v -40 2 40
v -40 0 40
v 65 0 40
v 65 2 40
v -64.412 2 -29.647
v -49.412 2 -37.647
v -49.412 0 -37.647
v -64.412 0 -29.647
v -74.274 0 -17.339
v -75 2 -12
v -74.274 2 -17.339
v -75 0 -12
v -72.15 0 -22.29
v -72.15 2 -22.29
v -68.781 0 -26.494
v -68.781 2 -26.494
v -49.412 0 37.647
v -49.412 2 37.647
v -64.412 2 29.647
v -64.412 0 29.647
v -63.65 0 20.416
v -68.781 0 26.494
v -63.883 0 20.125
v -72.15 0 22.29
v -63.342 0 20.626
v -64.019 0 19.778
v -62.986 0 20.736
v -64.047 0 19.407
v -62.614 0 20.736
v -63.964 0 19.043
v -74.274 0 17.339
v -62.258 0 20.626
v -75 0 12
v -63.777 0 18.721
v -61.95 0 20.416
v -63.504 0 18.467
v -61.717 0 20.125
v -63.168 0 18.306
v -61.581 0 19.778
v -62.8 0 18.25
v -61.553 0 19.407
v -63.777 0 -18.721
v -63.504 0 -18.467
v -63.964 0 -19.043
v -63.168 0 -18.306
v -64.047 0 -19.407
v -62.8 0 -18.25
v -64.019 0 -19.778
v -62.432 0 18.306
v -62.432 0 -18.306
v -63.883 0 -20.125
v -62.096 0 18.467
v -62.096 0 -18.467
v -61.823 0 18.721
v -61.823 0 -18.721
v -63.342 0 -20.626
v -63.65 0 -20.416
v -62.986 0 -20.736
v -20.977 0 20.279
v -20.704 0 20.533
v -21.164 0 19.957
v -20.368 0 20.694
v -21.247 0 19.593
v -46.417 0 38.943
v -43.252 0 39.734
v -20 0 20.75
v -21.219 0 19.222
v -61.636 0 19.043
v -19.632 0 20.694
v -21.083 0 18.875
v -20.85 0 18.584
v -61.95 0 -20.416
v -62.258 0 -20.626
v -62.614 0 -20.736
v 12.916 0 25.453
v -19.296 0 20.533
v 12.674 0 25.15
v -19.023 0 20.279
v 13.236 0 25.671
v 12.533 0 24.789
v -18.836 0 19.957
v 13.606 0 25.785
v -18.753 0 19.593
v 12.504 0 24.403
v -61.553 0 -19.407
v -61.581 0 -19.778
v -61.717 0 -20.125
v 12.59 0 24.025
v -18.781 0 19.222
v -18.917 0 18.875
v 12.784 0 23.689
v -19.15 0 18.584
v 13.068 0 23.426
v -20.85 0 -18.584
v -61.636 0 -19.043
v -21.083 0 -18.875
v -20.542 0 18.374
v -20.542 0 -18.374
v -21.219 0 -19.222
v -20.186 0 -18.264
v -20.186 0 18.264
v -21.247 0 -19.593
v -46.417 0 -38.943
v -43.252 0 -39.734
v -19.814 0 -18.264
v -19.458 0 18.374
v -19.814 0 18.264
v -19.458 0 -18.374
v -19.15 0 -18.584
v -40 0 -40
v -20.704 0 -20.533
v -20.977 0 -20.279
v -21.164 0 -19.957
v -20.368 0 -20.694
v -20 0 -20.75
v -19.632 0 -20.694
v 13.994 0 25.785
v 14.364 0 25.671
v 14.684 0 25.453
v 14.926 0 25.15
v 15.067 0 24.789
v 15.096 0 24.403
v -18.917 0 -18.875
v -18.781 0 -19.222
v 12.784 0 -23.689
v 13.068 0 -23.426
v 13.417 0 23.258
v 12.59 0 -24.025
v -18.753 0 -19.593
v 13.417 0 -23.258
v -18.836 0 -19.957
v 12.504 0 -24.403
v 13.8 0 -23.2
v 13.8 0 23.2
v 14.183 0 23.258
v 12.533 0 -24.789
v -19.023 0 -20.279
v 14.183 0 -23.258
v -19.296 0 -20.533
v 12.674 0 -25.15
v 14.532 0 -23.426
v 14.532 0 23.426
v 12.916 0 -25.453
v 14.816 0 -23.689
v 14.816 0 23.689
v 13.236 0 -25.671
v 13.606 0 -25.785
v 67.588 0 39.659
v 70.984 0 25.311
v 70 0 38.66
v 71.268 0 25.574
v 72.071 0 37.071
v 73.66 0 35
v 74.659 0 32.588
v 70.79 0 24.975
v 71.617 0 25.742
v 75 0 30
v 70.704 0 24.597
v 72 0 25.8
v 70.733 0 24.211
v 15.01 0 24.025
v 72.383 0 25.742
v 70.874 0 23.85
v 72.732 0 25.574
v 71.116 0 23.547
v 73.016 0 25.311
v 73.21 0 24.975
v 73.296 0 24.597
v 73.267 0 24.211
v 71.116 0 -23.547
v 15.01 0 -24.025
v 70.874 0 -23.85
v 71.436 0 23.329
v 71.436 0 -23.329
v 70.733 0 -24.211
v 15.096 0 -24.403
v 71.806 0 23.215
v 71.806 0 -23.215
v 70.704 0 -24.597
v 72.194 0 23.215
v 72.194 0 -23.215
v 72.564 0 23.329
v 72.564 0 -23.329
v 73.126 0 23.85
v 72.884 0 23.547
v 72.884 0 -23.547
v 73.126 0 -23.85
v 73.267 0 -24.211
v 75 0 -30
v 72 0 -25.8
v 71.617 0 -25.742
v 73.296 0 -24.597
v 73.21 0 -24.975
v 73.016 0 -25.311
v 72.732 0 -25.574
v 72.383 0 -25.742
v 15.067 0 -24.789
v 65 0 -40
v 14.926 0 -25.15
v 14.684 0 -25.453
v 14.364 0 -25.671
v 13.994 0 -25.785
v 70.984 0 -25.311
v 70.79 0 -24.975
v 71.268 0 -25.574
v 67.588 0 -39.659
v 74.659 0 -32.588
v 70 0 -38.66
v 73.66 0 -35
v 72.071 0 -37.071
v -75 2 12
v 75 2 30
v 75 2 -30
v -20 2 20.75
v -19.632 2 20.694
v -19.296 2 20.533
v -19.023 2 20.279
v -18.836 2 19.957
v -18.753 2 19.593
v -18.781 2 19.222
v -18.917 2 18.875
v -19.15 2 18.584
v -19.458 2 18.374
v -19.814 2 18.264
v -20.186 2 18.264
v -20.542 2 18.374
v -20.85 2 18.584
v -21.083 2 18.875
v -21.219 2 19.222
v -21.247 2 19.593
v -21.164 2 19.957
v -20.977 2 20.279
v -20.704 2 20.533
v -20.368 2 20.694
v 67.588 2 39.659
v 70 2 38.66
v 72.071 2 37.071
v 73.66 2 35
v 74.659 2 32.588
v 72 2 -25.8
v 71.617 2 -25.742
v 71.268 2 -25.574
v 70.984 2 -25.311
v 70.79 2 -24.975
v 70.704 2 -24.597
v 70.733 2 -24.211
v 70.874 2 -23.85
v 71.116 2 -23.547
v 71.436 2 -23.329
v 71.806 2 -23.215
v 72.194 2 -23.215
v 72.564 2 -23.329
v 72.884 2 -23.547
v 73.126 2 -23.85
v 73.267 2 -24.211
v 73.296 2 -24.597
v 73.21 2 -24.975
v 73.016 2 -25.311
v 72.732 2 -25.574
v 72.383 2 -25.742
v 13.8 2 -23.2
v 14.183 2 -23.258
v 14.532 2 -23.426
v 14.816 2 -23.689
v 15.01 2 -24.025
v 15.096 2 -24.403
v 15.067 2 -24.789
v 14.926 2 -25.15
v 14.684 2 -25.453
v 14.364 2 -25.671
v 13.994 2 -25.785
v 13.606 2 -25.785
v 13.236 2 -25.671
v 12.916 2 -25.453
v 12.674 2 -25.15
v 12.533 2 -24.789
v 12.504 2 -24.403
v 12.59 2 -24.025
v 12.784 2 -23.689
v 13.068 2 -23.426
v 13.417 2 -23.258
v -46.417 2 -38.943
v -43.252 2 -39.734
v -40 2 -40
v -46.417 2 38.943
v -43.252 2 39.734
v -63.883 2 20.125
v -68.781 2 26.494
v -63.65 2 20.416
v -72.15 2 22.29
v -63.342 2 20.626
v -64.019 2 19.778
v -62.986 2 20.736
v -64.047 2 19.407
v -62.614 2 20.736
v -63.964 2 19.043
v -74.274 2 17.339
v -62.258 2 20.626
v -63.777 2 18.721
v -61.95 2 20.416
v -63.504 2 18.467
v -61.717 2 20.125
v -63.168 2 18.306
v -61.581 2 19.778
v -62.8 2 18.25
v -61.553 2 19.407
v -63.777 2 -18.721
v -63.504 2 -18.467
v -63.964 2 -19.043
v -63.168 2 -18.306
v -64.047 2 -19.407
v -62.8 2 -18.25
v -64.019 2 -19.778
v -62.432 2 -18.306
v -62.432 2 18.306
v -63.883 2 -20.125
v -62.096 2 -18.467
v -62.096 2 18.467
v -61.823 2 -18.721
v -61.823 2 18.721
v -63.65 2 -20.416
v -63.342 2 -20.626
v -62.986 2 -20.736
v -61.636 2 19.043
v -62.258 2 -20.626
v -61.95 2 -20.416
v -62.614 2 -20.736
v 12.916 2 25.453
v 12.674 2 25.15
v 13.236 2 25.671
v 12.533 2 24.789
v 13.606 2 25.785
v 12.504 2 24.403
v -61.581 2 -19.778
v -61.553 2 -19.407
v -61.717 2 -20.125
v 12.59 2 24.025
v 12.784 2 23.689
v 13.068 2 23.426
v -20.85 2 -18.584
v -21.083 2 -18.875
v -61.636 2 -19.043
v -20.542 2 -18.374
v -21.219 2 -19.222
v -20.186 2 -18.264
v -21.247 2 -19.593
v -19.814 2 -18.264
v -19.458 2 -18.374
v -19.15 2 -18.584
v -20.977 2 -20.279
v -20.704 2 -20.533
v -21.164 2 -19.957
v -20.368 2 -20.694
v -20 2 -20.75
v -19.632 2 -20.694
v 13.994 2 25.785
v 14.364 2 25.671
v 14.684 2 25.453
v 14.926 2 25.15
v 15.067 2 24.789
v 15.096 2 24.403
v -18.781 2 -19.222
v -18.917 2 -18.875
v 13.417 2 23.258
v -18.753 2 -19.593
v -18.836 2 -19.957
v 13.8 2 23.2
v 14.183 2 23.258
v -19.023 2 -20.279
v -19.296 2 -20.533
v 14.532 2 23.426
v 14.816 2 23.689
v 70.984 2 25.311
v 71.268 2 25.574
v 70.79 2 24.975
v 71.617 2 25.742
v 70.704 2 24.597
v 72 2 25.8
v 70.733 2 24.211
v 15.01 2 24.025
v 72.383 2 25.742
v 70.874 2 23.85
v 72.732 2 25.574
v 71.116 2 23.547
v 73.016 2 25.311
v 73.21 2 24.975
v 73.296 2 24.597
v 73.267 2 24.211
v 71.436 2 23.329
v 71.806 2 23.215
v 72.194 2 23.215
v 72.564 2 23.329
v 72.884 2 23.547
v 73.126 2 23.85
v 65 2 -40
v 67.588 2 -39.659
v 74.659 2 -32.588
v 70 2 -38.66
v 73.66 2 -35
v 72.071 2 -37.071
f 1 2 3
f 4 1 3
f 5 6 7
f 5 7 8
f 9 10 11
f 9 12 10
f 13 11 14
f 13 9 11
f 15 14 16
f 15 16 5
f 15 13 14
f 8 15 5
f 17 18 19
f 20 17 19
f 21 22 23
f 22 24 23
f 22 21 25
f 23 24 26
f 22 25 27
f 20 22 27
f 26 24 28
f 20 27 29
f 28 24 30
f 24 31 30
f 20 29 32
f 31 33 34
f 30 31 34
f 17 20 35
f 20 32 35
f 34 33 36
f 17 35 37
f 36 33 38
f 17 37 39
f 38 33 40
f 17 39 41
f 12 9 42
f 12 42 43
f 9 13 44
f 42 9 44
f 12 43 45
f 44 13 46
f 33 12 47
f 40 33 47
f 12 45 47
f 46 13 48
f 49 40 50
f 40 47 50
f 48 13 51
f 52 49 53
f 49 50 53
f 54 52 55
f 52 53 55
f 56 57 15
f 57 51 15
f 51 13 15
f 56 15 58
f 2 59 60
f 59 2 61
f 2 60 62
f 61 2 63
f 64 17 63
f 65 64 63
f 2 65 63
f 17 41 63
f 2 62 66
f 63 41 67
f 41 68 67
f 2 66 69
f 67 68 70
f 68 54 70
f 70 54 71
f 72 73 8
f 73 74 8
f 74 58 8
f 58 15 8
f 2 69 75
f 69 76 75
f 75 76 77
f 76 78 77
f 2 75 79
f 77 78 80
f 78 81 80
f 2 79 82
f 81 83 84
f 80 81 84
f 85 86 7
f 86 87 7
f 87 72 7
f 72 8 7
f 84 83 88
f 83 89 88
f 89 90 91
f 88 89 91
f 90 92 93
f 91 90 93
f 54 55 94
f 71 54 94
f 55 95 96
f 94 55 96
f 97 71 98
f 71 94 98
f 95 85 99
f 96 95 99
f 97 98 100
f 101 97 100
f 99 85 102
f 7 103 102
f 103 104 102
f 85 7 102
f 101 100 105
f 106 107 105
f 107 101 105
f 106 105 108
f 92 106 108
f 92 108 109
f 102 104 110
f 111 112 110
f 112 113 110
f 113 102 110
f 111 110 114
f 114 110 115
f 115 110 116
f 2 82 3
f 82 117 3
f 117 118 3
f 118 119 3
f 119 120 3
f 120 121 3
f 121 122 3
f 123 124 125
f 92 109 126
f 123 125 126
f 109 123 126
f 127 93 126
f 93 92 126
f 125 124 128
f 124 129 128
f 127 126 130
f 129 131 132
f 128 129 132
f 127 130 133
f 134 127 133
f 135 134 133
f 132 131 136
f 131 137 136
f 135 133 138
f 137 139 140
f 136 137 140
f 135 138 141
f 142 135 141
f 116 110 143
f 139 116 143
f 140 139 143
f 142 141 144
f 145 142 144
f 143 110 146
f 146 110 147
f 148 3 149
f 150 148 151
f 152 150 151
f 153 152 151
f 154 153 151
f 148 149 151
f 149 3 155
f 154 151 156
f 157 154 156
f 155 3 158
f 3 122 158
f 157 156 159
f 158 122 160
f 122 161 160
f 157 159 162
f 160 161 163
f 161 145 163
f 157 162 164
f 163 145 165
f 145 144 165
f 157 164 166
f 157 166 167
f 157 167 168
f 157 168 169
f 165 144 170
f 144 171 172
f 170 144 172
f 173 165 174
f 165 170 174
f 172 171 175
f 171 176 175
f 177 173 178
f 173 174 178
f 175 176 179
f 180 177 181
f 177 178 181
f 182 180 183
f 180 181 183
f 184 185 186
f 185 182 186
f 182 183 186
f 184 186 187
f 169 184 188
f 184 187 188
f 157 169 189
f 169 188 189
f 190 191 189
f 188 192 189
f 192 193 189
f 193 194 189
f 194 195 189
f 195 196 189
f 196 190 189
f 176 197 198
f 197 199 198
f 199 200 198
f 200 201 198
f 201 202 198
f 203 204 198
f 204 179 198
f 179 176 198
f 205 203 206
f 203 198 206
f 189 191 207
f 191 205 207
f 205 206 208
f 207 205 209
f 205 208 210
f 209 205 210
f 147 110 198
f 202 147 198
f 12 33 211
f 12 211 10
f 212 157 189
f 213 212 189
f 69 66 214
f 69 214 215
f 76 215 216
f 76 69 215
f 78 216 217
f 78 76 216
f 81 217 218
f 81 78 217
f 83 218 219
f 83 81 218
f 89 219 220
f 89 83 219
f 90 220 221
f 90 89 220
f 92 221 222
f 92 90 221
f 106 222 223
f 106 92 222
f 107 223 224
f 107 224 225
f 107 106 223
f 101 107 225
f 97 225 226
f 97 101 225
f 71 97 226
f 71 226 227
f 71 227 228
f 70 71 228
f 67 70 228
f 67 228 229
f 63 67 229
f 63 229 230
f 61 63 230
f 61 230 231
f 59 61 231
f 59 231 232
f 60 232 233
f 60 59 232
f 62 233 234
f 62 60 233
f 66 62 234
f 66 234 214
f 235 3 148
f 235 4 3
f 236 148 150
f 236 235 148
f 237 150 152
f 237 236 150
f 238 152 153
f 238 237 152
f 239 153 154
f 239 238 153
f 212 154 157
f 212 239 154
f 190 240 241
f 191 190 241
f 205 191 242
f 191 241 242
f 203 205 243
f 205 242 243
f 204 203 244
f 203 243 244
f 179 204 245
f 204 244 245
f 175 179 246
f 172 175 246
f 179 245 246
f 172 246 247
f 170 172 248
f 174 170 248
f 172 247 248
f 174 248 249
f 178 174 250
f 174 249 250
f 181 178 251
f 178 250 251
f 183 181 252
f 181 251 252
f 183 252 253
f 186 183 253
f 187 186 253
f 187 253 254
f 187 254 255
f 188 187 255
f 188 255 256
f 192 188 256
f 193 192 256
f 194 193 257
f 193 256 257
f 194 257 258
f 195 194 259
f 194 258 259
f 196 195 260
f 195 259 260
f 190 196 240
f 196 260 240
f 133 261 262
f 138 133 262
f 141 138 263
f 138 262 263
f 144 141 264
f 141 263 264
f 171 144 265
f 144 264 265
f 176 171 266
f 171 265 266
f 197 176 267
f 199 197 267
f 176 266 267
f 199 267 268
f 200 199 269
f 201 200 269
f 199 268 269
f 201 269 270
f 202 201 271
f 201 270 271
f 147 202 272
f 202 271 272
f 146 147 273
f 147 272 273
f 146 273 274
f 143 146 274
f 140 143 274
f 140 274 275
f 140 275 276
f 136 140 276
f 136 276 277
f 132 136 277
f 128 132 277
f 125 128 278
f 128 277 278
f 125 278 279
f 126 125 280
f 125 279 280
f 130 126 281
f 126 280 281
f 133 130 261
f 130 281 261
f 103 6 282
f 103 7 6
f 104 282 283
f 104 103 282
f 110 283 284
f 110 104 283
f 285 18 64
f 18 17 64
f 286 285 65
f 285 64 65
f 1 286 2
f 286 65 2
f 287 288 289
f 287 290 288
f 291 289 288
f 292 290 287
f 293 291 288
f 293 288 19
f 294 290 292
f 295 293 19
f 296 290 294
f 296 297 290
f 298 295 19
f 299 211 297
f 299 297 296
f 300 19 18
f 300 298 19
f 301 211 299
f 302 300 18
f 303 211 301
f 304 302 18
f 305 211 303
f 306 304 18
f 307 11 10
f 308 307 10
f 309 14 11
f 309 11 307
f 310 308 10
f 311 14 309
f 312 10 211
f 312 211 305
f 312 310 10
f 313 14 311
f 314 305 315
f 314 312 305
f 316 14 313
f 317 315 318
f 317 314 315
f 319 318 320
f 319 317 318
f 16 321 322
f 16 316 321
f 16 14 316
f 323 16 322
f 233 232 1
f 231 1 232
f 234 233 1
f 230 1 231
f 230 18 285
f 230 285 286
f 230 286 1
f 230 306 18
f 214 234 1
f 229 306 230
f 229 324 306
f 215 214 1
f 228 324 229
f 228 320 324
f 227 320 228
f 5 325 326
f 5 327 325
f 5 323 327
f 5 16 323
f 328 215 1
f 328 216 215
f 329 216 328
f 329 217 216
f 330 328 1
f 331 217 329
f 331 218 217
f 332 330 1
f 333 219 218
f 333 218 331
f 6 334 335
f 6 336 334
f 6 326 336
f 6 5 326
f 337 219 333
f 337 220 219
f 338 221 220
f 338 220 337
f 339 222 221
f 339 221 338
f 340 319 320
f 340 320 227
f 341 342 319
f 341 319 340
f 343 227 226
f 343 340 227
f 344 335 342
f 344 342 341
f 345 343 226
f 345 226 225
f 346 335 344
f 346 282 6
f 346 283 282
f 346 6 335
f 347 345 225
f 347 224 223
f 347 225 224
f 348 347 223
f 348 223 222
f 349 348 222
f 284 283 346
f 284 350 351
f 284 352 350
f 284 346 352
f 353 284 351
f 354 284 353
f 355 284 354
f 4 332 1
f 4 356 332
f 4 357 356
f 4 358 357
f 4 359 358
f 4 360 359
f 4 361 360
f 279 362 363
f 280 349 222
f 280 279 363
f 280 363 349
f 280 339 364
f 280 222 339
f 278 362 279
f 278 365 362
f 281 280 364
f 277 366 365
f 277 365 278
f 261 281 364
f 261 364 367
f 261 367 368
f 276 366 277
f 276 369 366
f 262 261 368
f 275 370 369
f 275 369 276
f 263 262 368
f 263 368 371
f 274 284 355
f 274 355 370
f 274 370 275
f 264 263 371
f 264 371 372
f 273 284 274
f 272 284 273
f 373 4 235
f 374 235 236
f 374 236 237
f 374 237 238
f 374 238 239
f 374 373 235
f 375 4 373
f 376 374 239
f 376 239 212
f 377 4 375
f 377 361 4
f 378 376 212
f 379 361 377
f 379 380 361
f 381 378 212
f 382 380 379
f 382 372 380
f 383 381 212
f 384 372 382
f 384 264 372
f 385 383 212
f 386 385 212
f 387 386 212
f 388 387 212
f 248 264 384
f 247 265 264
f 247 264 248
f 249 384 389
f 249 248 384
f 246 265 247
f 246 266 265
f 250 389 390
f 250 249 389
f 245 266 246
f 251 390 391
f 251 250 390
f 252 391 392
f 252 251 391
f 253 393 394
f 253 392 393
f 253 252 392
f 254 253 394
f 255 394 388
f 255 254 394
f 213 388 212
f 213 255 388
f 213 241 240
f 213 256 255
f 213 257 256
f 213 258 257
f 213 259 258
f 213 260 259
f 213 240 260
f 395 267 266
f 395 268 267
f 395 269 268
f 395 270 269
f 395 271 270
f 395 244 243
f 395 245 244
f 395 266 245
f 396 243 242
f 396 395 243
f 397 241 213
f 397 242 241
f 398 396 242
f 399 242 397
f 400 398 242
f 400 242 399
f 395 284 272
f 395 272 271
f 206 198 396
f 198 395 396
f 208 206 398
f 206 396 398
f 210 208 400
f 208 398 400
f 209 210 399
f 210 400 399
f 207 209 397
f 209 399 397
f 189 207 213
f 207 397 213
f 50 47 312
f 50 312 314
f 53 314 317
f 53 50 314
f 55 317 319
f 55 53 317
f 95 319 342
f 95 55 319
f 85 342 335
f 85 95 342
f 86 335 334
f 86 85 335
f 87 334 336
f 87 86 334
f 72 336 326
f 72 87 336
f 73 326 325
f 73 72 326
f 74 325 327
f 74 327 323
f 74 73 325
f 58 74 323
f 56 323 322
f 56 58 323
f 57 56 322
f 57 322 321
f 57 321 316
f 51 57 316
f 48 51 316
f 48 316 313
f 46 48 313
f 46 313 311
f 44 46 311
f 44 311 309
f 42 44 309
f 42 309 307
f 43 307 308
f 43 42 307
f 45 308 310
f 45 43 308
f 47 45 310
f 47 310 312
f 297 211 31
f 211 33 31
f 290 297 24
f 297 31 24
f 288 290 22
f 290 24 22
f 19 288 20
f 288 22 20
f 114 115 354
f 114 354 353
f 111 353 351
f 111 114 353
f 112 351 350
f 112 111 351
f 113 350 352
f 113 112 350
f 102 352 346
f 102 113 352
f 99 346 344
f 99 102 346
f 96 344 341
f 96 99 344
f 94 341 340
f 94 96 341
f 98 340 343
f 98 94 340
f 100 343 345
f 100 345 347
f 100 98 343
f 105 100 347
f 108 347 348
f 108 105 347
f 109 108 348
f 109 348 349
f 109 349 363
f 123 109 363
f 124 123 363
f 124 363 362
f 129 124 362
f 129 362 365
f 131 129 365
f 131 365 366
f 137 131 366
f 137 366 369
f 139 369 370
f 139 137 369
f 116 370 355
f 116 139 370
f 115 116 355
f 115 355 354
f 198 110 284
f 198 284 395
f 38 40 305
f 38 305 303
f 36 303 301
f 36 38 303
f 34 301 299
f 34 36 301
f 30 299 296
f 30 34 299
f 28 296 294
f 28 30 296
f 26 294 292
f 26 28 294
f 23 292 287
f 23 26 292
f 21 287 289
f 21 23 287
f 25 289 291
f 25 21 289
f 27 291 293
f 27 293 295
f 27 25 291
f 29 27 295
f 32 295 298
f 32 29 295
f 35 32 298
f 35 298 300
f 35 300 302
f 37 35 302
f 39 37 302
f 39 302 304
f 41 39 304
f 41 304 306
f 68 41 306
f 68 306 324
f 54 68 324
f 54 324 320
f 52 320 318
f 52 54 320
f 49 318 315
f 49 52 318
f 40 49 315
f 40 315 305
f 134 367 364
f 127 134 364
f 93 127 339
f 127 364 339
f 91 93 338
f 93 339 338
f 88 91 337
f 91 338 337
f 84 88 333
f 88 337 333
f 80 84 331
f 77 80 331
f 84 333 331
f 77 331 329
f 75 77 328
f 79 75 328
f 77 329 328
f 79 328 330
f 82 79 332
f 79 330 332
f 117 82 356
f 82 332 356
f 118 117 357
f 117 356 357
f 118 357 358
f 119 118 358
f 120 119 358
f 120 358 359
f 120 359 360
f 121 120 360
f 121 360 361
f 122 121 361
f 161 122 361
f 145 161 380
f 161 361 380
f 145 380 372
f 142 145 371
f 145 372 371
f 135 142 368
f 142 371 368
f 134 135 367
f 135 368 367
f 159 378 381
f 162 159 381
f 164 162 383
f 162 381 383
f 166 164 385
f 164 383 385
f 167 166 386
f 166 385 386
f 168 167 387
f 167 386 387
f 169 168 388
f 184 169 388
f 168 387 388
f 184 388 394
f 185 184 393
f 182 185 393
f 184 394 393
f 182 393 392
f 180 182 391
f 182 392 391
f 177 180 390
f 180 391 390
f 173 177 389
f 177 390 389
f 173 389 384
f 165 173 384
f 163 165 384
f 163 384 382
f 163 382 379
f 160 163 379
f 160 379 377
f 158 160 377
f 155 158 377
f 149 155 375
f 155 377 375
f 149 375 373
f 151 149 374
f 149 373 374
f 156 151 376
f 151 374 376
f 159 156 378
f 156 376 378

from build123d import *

# Parameters (mm, degrees)
SKETCH_1_W          = 150
SKETCH_1_H          = 80
SKETCH_1_R          = 1.25
EXTRUDE_1_DEPTH     = 2
SKETCH_2_R          = 1.3
CUT_EXTRUDE_1_DEPTH = 2
CUT_EXTRUDE_2_DEPTH = 2
FILLET_1_R          = 20
FILLET_2_R          = 10


with BuildPart() as part:
    # 草图1 → 凸台-拉伸1 (new body)
    with BuildSketch(Plane(origin=(0, 0, 0), x_dir=(1, 0, 0), z_dir=(0, 1, 0))):
        Rectangle(SKETCH_1_W, SKETCH_1_H)
        with Locations(Location((-62.8, 19.5, 0), (0, 0, 270))):
            Circle(SKETCH_1_R, mode=Mode.SUBTRACT)
        with Locations(Location((-20, 19.5, 0), (0, 0, 90))):
            Circle(SKETCH_1_R, mode=Mode.SUBTRACT)
        with Locations(Location((-20, -19.5, 0), (0, 0, 270))):
            Circle(SKETCH_1_R, mode=Mode.SUBTRACT)
        with Locations(Location((-62.8, -19.5, 0), (0, 0, 90))):
            Circle(SKETCH_1_R, mode=Mode.SUBTRACT)
    extrude(amount=EXTRUDE_1_DEPTH)

    # 草图2 → 切除-拉伸1 (cut)
    with BuildSketch(Plane(origin=(0, 2, 0), x_dir=(1, 0, 0), z_dir=(0, 1, 0))):
        with Locations(Location((13.8, 24.5, 0), (0, 0, 270))):
            Circle(SKETCH_2_R)
        with Locations(Location((72, 24.5, 0), (0, 0, 90))):
            Circle(SKETCH_2_R)
        with Locations(Location((13.8, -24.5, 0), (0, 0, 90))):
            Circle(SKETCH_2_R)
        with Locations(Location((72, -24.5, 0), (0, 0, 270))):
            Circle(SKETCH_2_R)
    extrude(amount=-CUT_EXTRUDE_1_DEPTH, mode=Mode.SUBTRACT)

    # 草图3 → 切除-拉伸2 (cut)
    with BuildSketch(Plane(origin=(0, 2, 0), x_dir=(1, 0, 0), z_dir=(0, 1, 0))):
        Polygon((-75, 40), (-45, 40), (-75, 24), align=None)
        Polygon((-45, -40), (-75, -24), (-75, -40), align=None)
    extrude(amount=-CUT_EXTRUDE_2_DEPTH, mode=Mode.SUBTRACT)

    # 圆角1
    fillet_1_edges = [part.edges().sort_by_distance(p)[0] for p in [
        (-75, 1, -24),
        (-45, 1, -40),
        (-45, 1, 40),
        (-75, 1, 24),
    ]]
    fillet(fillet_1_edges, radius=FILLET_1_R)

    # 圆角2
    fillet_2_edges = [part.edges().sort_by_distance(p)[0] for p in [
        (75, 1, 40),
        (75, 1, -40),
    ]]
    fillet(fillet_2_edges, radius=FILLET_2_R)


solid = part.part
